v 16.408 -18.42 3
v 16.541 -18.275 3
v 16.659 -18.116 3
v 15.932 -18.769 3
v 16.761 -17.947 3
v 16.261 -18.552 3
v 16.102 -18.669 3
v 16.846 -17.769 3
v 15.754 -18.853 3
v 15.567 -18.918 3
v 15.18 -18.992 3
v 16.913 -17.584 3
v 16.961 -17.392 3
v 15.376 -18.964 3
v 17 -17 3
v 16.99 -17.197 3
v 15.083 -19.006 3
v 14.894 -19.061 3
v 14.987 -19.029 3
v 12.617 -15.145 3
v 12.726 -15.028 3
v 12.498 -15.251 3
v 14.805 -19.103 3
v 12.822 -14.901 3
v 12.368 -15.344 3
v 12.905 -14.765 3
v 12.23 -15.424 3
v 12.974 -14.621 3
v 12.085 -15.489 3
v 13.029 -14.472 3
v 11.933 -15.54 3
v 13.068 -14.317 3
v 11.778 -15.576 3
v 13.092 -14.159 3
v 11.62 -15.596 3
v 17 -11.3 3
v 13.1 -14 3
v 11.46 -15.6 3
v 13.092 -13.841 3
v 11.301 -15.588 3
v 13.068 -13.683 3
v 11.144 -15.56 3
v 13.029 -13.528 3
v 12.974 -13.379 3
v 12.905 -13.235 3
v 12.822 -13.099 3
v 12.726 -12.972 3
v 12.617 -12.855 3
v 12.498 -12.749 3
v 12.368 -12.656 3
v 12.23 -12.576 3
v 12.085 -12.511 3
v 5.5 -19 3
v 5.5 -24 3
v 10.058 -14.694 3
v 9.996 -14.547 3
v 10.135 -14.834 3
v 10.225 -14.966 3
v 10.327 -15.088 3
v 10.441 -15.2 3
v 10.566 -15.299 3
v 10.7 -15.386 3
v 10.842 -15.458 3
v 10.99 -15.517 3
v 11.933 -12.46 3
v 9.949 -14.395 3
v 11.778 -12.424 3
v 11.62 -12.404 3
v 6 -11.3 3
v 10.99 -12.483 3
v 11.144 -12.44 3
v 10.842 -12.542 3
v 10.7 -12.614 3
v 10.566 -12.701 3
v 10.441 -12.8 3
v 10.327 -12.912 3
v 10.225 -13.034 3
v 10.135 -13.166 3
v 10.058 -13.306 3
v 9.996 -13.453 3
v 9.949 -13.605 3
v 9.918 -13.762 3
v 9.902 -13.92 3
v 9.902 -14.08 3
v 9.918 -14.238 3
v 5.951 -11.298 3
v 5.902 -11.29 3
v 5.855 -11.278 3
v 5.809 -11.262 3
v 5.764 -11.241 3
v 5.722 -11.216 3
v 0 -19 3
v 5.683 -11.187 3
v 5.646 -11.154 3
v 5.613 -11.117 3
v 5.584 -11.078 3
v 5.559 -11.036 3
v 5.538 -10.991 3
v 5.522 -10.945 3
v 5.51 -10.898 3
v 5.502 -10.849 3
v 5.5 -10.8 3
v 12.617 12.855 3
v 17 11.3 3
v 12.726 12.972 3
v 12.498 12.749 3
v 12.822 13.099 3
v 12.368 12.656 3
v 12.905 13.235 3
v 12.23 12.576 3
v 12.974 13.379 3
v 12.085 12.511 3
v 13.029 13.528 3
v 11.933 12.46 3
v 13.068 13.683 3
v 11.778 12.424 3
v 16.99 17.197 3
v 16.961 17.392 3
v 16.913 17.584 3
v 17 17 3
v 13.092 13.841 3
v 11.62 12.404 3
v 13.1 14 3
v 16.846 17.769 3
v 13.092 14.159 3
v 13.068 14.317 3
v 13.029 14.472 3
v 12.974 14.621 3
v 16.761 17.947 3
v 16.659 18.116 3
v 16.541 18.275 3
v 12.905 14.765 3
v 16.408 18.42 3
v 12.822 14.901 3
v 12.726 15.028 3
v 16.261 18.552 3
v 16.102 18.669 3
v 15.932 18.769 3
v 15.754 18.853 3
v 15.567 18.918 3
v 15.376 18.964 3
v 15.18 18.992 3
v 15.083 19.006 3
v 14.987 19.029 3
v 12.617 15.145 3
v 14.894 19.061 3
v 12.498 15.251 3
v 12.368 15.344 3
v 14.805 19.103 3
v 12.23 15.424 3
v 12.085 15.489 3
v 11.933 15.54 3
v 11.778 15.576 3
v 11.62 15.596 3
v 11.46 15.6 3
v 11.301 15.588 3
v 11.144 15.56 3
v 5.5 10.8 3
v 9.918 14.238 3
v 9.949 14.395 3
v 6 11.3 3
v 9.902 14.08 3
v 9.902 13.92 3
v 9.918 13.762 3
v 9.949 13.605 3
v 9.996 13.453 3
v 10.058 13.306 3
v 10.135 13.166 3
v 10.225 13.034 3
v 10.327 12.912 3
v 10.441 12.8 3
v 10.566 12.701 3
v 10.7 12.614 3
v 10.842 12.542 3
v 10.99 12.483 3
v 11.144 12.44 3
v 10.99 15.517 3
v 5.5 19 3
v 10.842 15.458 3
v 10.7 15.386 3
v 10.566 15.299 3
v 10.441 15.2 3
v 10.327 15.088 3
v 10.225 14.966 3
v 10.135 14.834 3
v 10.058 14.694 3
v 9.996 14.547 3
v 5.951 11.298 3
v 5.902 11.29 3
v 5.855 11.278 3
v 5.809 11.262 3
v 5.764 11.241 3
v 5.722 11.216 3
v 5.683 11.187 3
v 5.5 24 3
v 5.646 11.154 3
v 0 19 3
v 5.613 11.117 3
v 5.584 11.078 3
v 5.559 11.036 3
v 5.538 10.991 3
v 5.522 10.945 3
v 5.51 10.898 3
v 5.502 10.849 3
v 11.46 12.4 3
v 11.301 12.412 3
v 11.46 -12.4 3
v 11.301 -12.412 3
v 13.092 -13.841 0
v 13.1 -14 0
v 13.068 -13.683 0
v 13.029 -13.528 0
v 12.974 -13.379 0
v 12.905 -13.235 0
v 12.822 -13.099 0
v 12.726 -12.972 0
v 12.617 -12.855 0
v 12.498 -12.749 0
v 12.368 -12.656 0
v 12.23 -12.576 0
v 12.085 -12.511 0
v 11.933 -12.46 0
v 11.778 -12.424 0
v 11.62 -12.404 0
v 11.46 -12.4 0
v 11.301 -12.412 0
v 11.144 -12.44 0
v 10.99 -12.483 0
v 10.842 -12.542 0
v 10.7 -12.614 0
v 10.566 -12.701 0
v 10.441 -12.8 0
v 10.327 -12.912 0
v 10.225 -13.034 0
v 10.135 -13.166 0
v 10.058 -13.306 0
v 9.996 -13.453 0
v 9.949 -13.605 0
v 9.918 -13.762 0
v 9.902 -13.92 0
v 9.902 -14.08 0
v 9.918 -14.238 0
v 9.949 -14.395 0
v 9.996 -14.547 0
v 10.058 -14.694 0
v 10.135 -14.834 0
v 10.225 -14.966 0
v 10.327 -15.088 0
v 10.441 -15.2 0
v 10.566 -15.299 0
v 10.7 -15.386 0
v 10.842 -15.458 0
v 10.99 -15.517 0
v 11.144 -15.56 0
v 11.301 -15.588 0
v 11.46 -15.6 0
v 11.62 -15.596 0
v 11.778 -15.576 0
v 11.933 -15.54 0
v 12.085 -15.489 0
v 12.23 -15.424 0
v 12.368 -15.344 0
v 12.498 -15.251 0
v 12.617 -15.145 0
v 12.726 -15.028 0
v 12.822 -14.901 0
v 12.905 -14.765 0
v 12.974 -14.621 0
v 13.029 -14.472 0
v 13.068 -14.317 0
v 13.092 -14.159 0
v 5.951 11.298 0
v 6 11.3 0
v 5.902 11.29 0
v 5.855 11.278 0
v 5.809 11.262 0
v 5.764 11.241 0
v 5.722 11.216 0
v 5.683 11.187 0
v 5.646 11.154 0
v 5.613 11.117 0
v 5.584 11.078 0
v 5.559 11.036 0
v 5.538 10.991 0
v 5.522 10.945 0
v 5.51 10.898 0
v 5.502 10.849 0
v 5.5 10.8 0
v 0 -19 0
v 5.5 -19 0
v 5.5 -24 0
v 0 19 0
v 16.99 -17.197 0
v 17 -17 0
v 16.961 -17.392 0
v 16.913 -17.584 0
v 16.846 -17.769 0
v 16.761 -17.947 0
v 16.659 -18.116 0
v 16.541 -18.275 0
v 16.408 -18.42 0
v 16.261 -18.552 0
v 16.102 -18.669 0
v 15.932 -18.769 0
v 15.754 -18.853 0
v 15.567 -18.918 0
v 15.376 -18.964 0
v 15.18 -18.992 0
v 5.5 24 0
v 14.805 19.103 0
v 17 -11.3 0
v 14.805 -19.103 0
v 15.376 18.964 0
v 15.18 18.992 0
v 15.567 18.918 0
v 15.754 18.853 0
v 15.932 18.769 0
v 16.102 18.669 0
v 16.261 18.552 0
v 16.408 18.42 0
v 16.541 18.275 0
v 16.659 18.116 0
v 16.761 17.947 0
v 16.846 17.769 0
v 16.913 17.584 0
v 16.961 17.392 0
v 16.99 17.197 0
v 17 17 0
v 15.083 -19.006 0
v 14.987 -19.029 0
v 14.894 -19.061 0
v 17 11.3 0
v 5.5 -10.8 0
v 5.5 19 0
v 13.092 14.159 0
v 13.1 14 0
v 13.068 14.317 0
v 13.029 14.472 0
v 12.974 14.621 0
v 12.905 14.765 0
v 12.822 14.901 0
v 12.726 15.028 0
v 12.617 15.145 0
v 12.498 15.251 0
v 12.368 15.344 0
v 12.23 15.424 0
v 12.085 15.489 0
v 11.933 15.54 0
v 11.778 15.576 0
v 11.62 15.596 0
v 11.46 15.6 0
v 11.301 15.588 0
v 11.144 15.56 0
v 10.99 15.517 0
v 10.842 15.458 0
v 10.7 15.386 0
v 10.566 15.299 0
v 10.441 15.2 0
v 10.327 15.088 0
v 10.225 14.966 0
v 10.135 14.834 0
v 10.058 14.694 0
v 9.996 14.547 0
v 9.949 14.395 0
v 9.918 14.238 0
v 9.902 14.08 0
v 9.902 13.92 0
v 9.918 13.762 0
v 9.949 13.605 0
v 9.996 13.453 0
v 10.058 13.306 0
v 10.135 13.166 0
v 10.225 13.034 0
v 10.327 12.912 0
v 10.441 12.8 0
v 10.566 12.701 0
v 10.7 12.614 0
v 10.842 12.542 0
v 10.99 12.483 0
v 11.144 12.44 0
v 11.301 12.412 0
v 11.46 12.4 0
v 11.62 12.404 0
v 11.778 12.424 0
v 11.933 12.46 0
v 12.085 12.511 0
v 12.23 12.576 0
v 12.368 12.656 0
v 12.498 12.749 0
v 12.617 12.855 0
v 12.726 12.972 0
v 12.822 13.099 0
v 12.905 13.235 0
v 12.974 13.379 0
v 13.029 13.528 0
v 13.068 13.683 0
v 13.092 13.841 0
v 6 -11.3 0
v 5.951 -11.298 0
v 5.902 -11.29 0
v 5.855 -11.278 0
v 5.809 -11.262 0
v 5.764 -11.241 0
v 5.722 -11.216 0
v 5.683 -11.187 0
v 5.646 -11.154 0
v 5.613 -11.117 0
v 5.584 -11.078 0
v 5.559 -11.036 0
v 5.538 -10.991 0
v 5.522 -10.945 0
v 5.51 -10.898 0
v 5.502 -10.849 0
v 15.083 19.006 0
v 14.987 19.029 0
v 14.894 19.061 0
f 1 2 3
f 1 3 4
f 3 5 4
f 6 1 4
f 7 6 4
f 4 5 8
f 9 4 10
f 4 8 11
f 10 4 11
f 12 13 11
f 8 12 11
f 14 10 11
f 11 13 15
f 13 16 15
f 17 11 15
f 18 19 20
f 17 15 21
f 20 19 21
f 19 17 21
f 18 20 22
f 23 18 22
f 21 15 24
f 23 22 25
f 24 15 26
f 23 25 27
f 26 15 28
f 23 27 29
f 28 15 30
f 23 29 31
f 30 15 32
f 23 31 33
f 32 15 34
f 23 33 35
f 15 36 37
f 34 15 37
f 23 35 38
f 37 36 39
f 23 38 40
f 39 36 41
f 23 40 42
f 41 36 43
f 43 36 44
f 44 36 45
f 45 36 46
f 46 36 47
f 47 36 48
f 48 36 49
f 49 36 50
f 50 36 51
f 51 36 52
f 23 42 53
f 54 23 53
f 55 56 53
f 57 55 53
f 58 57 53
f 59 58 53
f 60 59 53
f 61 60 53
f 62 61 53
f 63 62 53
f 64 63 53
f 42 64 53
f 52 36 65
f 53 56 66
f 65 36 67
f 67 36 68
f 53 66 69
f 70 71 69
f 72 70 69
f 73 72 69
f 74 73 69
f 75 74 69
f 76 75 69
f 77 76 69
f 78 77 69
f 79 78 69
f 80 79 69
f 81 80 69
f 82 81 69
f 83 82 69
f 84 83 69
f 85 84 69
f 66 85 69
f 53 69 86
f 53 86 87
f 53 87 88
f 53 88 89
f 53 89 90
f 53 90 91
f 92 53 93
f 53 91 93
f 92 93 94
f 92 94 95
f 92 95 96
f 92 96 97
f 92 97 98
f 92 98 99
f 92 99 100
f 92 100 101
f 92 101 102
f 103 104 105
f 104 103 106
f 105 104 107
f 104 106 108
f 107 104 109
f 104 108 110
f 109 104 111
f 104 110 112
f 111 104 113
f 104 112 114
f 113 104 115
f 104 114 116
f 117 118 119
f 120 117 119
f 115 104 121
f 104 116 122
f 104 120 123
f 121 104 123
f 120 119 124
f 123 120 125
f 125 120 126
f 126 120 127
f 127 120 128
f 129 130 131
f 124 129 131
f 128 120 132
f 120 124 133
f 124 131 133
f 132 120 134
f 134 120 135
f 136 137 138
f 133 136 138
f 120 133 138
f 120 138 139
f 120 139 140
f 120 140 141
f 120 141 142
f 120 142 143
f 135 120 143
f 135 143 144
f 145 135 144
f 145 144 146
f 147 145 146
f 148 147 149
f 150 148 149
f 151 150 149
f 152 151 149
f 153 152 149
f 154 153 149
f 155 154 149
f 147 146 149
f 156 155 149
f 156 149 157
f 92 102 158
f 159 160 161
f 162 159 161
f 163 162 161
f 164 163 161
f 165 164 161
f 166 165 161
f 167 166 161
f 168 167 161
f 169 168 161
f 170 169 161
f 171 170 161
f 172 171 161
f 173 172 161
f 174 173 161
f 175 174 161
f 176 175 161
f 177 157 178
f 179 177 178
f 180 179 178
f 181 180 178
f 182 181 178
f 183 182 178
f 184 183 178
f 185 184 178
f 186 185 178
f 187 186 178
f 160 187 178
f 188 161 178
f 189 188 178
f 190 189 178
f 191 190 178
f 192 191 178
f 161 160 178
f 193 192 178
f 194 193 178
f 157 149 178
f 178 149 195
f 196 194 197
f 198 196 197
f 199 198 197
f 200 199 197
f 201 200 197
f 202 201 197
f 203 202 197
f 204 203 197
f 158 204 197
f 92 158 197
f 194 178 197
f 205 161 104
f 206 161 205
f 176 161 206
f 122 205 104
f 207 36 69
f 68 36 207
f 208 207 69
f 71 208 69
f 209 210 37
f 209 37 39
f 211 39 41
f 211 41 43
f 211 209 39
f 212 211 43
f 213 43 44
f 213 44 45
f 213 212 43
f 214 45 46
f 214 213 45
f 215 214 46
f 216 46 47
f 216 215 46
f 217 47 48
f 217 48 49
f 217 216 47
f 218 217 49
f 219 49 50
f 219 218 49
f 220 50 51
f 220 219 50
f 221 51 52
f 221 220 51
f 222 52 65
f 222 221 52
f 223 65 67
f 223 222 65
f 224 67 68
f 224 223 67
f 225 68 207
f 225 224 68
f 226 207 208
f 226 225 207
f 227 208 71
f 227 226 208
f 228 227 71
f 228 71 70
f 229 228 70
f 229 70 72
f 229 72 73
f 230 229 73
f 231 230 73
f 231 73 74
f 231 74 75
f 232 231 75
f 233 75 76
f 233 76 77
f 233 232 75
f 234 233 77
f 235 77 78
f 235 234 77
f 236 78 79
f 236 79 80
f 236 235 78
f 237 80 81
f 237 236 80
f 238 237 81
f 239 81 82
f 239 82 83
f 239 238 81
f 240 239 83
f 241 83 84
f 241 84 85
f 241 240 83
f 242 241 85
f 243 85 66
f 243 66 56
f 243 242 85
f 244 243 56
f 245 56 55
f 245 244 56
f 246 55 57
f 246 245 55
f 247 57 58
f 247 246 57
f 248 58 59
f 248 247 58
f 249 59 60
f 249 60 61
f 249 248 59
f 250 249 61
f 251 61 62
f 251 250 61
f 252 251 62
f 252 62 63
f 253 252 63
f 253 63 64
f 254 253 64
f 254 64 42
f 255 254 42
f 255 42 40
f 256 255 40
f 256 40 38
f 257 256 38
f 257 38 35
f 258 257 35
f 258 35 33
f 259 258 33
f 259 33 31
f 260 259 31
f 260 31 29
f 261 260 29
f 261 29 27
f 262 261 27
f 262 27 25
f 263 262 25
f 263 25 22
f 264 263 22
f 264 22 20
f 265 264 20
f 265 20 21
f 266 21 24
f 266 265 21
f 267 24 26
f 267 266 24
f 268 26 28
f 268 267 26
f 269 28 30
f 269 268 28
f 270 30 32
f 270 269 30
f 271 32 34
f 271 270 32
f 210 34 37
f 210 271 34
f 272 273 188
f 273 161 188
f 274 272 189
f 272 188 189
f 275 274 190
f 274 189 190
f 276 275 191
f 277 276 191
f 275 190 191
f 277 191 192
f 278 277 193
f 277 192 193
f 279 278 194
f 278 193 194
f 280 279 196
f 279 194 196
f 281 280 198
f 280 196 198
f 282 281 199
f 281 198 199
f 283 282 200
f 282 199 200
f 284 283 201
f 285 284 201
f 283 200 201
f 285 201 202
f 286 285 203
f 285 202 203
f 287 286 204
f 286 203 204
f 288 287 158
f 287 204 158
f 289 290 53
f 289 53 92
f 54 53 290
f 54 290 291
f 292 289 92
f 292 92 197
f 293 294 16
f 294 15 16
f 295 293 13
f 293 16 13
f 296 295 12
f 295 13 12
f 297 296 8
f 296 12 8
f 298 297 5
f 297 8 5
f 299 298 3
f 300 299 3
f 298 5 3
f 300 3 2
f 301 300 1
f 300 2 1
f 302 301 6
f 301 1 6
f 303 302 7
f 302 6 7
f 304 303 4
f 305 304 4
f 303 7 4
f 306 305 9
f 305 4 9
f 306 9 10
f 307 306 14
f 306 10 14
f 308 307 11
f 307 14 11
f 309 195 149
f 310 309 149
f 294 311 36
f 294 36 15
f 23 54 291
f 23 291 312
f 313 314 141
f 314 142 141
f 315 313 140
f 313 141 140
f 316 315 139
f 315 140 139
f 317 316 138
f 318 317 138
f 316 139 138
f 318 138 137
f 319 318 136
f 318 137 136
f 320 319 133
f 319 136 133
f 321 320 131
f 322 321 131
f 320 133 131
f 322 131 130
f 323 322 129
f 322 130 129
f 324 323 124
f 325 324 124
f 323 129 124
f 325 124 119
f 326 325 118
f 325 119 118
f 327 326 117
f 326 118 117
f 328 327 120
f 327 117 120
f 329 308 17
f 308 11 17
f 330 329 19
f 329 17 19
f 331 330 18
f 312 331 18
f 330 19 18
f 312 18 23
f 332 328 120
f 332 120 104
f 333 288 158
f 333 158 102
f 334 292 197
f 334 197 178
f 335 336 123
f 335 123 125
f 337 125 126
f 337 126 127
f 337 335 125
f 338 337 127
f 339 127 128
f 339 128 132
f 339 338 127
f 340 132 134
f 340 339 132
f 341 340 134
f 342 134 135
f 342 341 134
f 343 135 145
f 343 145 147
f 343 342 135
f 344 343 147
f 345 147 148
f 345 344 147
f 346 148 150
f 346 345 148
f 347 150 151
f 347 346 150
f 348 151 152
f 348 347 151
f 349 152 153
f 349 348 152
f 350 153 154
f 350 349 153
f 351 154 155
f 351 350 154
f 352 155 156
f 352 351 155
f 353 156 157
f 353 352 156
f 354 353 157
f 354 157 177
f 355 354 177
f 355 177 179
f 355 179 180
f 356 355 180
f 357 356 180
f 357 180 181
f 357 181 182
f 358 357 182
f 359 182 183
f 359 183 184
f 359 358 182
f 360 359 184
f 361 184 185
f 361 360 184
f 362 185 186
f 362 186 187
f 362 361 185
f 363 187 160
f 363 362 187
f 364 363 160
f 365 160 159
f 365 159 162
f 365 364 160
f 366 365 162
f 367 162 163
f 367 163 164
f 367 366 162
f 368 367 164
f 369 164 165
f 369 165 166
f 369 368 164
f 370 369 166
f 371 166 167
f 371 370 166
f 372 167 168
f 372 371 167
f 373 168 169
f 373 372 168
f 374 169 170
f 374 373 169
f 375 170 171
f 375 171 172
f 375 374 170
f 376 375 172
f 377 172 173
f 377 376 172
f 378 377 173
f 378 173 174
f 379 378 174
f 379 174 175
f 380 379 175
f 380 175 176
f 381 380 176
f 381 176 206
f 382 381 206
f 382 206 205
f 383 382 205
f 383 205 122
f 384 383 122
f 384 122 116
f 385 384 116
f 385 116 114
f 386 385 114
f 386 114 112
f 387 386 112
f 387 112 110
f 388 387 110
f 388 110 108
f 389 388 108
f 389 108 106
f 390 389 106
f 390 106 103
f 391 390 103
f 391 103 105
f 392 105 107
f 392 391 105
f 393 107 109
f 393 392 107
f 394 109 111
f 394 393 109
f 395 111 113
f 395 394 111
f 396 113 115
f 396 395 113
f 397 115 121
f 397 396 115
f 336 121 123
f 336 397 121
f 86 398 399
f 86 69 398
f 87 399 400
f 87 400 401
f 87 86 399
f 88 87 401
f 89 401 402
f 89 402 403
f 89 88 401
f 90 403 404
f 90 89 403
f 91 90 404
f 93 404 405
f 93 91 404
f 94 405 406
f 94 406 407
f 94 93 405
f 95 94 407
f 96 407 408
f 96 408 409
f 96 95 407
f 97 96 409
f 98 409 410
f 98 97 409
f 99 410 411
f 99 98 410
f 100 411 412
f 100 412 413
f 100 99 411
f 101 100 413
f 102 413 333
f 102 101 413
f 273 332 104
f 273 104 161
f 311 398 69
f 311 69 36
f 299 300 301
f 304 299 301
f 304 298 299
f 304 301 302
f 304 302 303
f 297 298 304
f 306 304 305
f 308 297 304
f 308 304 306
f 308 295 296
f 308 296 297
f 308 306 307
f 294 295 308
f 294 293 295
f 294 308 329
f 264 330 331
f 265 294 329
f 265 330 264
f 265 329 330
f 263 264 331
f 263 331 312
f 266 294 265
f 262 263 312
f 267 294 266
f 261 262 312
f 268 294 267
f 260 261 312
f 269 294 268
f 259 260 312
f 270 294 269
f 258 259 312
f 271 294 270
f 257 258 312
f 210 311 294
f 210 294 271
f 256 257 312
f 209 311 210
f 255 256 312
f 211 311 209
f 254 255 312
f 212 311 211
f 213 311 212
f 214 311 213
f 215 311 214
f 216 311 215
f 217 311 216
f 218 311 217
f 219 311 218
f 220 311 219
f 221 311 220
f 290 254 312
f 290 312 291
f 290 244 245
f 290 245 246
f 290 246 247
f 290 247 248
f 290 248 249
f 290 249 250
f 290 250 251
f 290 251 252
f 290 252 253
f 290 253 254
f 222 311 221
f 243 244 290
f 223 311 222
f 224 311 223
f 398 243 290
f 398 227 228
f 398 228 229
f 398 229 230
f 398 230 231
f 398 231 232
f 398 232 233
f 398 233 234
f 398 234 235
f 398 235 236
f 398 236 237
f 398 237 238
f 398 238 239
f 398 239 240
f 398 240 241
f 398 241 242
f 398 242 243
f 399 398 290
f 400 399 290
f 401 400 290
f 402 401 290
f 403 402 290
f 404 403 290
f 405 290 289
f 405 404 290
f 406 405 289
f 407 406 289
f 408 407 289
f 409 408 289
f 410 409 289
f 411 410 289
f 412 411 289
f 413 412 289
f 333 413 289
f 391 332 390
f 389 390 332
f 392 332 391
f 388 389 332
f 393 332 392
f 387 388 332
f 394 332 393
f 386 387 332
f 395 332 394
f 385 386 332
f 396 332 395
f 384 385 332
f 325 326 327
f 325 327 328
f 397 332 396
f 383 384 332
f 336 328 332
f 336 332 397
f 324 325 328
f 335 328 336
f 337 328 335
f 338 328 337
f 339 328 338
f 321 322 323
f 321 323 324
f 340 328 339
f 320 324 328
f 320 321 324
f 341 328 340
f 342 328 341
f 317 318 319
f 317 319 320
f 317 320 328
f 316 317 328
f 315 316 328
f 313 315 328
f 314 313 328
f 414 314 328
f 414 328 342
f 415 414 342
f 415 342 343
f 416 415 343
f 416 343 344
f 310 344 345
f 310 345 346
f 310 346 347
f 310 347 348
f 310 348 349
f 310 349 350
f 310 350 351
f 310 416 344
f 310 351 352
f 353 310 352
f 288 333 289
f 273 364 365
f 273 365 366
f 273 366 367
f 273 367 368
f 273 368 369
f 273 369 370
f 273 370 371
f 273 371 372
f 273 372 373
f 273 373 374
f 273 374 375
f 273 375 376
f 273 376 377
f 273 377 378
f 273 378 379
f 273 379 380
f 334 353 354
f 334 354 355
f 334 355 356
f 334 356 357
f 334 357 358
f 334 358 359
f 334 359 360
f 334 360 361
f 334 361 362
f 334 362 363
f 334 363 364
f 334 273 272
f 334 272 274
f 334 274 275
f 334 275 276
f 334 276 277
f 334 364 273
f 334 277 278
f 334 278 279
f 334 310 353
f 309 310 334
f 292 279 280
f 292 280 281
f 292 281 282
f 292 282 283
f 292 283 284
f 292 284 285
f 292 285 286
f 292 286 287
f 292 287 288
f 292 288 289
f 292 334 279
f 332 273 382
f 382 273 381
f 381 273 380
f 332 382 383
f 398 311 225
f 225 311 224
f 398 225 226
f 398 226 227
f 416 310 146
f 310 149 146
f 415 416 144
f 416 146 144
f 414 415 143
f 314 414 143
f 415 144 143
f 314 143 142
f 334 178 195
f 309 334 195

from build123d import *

# Parameters (mm, degrees)
SKETCH_1_R      = 1.6
EXTRUDE_1_DEPTH = 3
FILLET_1_R      = 0.5
FILLET_2_R      = 2
EXTRUDE_2_DEPTH = 3
FILLET_3_R      = 1


with BuildPart() as part:
    # ｽｹｯﾁ1 → ﾎﾞｽ - 押し出し1 (new body)
    with BuildSketch(Plane.XY):
        Polygon((0, -19), (0, 19), (17, 19), (17, 11.3), (5.5, 11.3), (5.5, -11.3), (17, -11.3), (17, -19), align=None)
        with Locations((11.5, 14)):
            Circle(SKETCH_1_R, mode=Mode.SUBTRACT)
        with Locations((11.5, -14)):
            Circle(SKETCH_1_R, mode=Mode.SUBTRACT)
    extrude(amount=EXTRUDE_1_DEPTH)

    # ﾌｨﾚｯﾄ1
    fillet_1_edges = [part.edges().sort_by_distance(p)[0] for p in [
        (5.5, 11.3, 1.5),
        (5.5, -11.3, 1.5),
    ]]
    fillet(fillet_1_edges, radius=FILLET_1_R)

    # ﾌｨﾚｯﾄ2
    fillet_2_edges = [part.edges().sort_by_distance(p)[0] for p in [
        (17, 19, 1.5),
        (17, -19, 1.5),
    ]]
    fillet(fillet_2_edges, radius=FILLET_2_R)

    # ｽｹｯﾁ2 → ﾎﾞｽ - 押し出し2 (add)
    with BuildSketch(Plane.XY.offset(3)):
        Polygon((5.5, 19), (5.5, 24), (15, 19), align=None)
        Polygon((5.5, -19), (5.5, -24), (15, -19), align=None)
    extrude(amount=-EXTRUDE_2_DEPTH)

    # ﾌｨﾚｯﾄ3
    fillet_3_edges = [part.edges().sort_by_distance(p)[0] for p in [
        (15, 19, 1.5),
        (15, -19, 1.5),
    ]]
    fillet(fillet_3_edges, radius=FILLET_3_R)


solid = part.part
